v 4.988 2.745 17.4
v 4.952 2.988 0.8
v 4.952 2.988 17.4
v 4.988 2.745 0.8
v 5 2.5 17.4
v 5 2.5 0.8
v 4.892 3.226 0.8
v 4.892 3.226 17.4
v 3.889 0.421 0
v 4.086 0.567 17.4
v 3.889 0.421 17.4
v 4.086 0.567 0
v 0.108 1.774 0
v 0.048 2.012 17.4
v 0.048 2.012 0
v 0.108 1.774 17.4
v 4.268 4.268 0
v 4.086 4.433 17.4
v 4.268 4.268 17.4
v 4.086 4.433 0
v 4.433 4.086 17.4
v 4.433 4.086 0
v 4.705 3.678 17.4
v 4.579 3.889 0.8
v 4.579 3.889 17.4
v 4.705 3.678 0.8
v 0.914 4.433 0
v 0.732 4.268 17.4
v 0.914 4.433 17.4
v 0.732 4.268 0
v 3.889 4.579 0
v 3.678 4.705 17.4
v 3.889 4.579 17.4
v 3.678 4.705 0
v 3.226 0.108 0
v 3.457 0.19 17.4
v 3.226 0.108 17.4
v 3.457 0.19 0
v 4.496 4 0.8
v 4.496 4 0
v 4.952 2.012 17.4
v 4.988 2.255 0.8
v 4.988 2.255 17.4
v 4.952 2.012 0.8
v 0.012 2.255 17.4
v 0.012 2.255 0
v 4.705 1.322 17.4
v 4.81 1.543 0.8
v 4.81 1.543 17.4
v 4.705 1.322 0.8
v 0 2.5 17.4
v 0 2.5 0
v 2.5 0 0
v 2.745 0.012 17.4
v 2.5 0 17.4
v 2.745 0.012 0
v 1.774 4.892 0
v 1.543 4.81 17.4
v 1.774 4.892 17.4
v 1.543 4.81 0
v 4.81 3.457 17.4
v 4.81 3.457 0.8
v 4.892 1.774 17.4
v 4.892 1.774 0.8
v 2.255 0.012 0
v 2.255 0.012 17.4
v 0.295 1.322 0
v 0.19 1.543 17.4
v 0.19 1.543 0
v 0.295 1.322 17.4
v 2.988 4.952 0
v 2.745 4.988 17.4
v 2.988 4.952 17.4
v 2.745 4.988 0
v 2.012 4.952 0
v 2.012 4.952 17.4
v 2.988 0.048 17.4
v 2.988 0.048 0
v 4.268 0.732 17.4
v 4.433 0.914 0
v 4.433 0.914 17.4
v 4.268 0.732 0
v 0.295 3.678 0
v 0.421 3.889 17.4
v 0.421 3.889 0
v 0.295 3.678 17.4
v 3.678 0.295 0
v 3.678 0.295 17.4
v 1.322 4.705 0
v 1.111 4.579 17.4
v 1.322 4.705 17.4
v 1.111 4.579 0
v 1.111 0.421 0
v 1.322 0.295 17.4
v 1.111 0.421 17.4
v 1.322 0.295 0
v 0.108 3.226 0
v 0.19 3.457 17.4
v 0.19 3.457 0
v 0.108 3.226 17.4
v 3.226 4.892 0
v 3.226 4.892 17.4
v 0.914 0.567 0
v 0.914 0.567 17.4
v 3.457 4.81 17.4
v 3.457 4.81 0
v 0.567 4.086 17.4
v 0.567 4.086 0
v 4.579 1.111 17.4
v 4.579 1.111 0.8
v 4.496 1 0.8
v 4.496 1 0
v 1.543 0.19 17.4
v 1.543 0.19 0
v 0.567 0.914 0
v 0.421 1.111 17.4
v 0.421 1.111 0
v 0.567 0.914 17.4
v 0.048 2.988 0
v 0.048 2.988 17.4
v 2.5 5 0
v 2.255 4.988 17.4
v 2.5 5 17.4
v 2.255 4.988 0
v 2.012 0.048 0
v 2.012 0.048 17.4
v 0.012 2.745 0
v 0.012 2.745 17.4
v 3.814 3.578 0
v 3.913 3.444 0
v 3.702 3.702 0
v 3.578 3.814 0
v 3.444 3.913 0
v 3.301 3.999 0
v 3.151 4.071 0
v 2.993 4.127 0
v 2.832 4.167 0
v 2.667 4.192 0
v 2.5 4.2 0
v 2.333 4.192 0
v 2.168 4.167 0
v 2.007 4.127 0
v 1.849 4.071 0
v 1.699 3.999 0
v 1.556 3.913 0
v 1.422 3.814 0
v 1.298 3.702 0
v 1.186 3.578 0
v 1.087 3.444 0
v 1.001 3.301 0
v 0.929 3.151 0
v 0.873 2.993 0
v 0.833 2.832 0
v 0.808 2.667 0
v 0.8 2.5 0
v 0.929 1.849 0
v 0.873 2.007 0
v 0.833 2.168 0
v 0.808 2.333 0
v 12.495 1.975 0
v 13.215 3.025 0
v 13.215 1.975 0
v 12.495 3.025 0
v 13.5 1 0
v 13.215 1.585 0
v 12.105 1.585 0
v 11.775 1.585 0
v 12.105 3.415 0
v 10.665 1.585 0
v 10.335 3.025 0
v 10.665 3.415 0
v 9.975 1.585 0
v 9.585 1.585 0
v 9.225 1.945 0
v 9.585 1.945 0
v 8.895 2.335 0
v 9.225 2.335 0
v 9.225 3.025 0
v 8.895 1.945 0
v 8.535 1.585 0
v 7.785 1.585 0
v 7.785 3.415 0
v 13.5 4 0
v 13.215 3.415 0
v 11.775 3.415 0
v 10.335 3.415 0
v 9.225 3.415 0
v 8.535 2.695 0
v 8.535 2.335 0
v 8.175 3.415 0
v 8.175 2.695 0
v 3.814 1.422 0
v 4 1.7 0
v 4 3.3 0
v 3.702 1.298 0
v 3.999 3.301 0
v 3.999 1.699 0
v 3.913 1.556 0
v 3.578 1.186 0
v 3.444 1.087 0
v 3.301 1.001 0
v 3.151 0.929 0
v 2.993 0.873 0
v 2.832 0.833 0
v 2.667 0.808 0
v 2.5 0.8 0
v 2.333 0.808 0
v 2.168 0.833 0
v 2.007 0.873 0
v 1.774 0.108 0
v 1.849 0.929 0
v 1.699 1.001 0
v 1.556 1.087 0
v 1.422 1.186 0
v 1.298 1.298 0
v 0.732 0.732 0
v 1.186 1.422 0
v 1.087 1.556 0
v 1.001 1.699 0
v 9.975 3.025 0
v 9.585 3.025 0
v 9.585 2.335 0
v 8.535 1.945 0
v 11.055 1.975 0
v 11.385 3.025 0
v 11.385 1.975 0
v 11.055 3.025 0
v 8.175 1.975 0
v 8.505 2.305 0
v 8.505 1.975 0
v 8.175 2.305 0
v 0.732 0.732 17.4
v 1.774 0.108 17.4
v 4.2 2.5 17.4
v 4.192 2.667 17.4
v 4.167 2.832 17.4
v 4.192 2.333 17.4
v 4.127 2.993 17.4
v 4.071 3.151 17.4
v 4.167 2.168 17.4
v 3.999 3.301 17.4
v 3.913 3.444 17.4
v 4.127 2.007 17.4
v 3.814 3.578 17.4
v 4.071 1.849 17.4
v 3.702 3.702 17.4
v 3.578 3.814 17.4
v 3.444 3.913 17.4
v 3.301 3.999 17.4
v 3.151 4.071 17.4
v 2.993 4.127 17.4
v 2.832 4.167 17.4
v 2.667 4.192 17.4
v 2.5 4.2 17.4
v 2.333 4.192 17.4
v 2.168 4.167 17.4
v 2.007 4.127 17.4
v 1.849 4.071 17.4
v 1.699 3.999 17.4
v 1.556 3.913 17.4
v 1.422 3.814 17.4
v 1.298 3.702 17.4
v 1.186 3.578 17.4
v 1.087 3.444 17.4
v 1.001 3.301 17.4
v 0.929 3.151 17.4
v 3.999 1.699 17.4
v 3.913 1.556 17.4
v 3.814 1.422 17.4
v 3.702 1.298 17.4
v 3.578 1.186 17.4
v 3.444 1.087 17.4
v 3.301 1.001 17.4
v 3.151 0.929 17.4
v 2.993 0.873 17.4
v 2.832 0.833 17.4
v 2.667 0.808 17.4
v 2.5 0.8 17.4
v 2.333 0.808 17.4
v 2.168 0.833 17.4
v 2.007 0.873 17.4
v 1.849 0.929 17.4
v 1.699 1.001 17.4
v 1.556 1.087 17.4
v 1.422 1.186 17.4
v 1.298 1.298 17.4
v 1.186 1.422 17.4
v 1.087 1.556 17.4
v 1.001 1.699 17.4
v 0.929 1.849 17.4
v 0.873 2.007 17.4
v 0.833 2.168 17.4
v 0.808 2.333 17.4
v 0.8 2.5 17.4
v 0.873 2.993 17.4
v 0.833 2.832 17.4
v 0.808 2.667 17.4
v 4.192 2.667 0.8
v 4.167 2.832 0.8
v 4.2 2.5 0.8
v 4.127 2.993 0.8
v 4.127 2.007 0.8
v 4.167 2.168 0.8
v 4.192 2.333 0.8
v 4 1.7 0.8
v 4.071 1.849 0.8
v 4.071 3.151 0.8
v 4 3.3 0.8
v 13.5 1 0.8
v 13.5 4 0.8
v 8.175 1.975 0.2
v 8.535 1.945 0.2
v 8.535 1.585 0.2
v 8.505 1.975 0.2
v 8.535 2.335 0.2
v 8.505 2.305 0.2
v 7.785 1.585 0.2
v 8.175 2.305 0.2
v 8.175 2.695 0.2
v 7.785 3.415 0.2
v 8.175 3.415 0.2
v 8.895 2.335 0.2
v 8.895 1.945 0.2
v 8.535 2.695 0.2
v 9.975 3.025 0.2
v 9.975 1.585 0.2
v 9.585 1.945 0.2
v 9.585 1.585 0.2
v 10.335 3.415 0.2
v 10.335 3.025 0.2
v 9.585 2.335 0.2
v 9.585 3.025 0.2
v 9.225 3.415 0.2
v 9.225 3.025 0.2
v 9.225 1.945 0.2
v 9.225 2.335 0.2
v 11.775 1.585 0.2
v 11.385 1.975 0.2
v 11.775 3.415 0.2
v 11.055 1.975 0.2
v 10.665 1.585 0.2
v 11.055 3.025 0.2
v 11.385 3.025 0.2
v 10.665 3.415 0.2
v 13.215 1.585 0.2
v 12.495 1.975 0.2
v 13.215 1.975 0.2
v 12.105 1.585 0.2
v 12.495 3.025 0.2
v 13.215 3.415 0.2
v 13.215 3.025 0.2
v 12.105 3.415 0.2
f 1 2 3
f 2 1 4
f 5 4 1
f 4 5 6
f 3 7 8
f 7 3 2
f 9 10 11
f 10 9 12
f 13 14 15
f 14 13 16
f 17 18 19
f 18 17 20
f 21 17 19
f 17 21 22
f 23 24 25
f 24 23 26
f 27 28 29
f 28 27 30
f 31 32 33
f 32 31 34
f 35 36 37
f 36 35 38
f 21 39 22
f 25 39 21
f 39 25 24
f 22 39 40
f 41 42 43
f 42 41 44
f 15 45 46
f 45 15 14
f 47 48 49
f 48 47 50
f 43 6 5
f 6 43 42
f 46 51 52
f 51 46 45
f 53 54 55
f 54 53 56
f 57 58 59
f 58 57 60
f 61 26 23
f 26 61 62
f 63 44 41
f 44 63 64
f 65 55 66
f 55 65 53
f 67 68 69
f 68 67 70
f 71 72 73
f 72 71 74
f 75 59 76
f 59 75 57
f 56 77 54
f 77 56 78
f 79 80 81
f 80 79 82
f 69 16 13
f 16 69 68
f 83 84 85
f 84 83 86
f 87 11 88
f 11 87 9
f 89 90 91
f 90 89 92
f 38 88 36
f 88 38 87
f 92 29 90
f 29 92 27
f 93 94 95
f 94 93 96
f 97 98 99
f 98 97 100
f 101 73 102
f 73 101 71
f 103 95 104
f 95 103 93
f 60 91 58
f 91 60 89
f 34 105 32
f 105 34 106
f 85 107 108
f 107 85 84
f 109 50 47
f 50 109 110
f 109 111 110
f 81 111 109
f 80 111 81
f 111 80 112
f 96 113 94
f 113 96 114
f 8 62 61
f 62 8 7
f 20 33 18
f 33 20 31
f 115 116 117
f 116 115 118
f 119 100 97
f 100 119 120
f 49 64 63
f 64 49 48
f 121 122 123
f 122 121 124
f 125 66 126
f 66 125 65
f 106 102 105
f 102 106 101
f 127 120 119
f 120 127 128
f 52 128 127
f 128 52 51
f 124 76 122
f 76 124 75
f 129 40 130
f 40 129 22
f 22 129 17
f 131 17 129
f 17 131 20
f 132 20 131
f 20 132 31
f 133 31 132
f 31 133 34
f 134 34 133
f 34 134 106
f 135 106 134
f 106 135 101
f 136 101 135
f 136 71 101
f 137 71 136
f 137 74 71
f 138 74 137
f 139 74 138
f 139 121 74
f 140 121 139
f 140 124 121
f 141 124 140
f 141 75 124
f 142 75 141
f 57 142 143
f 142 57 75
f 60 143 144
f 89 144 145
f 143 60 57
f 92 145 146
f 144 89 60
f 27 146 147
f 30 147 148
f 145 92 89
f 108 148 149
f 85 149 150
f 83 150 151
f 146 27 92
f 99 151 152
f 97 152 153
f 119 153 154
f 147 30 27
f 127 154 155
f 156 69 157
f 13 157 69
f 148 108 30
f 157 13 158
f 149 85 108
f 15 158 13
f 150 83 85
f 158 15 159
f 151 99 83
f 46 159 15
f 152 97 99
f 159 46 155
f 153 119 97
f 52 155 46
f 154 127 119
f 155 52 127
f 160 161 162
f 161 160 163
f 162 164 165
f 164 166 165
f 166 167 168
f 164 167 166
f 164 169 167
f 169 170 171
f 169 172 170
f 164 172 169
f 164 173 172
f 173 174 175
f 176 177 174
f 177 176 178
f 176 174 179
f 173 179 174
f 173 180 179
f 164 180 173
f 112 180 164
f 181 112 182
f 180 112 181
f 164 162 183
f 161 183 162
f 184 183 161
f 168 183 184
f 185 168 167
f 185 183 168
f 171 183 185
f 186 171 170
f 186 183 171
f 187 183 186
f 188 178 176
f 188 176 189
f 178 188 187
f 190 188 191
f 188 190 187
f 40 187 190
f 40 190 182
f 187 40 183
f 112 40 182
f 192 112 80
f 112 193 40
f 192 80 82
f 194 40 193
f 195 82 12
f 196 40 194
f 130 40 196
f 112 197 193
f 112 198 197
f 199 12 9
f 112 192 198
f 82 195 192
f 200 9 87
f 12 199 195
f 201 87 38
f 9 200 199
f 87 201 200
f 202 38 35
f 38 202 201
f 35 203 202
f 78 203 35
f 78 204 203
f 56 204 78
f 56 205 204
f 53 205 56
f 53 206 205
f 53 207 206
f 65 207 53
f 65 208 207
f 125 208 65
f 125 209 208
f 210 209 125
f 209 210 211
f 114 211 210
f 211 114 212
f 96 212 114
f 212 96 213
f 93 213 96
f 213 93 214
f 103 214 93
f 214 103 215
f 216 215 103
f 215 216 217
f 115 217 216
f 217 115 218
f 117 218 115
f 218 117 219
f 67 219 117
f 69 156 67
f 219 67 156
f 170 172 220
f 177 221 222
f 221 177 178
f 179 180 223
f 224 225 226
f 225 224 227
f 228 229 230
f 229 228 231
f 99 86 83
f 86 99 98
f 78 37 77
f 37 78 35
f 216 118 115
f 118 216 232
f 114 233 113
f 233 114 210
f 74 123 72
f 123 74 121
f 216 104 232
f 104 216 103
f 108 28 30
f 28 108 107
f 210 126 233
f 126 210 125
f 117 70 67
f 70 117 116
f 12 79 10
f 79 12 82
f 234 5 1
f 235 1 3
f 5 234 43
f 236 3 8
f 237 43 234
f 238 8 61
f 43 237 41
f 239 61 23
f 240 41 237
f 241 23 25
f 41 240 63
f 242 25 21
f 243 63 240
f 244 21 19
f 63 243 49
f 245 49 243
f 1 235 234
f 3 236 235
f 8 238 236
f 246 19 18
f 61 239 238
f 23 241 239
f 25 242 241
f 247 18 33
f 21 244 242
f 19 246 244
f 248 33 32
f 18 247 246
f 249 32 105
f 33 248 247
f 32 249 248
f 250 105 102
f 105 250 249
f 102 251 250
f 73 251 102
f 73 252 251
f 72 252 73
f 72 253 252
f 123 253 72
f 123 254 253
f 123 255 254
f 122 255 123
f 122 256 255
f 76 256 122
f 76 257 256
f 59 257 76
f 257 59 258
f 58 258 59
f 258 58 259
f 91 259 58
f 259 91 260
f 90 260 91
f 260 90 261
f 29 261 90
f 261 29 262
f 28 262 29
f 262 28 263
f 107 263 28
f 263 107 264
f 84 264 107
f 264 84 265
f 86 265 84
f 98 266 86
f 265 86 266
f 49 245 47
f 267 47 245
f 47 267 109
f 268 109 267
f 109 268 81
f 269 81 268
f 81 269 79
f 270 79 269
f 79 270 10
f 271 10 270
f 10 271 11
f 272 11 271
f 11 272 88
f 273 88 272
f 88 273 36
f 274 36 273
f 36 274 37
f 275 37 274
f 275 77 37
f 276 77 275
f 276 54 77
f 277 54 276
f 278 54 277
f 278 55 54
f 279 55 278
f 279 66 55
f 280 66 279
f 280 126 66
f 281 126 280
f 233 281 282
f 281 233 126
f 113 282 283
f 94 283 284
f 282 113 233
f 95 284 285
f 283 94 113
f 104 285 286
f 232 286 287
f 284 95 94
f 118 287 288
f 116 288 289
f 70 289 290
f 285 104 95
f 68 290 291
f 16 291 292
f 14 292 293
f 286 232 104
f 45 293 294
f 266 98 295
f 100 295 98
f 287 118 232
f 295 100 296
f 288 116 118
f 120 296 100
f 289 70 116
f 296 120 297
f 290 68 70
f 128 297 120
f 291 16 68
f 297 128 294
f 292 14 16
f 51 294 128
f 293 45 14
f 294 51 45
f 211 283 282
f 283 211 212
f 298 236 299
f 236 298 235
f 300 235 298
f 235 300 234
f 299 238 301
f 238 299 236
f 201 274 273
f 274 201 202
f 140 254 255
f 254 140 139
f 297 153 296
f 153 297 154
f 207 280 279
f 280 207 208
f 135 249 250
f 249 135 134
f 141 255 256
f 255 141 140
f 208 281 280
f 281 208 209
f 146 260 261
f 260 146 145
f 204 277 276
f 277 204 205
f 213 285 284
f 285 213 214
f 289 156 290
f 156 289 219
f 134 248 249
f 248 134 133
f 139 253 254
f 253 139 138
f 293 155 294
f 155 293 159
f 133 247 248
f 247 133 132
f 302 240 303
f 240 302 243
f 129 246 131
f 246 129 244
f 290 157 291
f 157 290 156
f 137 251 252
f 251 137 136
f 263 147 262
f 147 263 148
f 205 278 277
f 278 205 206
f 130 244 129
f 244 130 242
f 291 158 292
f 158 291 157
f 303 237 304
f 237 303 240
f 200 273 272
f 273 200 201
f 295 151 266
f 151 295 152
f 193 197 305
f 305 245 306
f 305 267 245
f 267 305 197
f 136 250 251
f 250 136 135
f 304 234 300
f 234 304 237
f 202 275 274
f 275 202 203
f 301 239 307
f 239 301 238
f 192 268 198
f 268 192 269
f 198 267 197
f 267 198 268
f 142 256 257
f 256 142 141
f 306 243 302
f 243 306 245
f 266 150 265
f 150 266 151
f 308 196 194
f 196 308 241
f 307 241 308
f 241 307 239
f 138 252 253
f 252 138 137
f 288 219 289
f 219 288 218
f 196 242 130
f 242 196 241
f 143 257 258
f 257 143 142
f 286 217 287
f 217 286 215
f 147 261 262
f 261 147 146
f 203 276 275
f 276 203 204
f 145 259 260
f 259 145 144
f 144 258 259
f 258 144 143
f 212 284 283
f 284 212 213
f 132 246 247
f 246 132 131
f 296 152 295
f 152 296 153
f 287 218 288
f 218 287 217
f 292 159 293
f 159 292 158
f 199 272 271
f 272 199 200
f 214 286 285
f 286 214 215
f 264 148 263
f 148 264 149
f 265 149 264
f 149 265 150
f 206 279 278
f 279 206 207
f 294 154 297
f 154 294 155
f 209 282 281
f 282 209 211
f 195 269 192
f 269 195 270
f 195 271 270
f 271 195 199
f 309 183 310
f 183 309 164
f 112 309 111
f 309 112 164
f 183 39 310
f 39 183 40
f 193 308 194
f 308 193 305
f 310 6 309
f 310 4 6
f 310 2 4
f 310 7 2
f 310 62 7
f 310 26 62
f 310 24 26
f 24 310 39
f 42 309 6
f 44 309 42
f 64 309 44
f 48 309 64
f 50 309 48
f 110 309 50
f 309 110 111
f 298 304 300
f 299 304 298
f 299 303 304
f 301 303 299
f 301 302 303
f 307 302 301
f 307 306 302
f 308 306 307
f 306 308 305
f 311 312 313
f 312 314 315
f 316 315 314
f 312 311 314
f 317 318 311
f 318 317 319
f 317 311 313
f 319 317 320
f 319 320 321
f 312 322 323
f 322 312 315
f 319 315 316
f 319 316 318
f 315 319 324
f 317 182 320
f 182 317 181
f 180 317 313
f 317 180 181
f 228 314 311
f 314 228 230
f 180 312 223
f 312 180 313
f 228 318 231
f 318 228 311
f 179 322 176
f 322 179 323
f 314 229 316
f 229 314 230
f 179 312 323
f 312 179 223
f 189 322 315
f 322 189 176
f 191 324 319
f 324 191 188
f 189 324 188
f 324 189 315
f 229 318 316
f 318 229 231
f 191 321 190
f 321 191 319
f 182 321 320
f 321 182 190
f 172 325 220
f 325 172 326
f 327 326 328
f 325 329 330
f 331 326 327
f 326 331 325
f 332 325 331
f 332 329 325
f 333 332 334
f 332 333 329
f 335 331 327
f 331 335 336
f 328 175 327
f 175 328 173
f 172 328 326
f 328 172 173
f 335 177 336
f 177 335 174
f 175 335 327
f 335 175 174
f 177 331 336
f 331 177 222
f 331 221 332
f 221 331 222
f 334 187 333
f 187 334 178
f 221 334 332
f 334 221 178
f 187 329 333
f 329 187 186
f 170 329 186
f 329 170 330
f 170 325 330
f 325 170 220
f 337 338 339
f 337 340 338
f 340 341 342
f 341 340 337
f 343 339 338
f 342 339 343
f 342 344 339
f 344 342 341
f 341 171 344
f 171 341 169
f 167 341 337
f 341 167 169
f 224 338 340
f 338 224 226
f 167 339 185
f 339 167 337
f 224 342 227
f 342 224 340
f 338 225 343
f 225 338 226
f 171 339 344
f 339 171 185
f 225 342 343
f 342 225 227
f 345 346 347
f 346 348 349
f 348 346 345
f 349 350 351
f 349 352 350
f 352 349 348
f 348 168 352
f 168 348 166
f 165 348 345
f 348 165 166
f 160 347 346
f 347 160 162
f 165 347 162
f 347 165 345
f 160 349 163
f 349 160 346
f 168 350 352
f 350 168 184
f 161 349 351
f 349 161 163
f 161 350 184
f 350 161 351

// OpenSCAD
// 輪軸隔套含編號耳
$fn=64;
translate([2.5,-64.33504,1.1]){rotate([90,0,0]){difference(){union(){difference(){translate([0,-1.1,-66.83504]){rotate([-90,0,0]){translate([0,0,0]){cylinder(h=17.4,d1=5,d2=5,$fn=64);}}}translate([0,-2.1,-66.83504]){rotate([-90,0,0]){translate([0,0,0]){cylinder(h=19.4,d1=3.4,d2=3.4,$fn=64);}}}}translate([1.5,-1.1,-68.33504]){cube([9.5,0.8,3]);}}multmatrix([[1,0,0,8],[0,0,-1,-1.1],[0,1,0,-66.83504],[0,0,0,1]]){union(){union(){union(){union(){union(){union(){union(){union(){union(){union(){union(){union(){union(){union(){union(){union(){union(){union(){union(){union(){union(){union(){union(){union(){union(){union(){union(){union(){union(){union(){union(){union(){union(){union(){union(){union(){translate([-2.715,0.525,-0.2]){cube([0.39,0.39,0.32]);}translate([-2.355,0.525,-0.2]){cube([0.39,0.39,0.32]);}}translate([-2.715,0.165,-0.2]){cube([0.39,0.39,0.32]);}}translate([-1.995,0.165,-0.2]){cube([0.39,0.39,0.32]);}}translate([-2.715,-0.195,-0.2]){cube([0.39,0.39,0.32]);}}translate([-2.355,-0.195,-0.2]){cube([0.39,0.39,0.32]);}}translate([-2.715,-0.555,-0.2]){cube([0.39,0.39,0.32]);}}translate([-2.715,-0.915,-0.2]){cube([0.39,0.39,0.32]);}}translate([-0.915,0.525,-0.2]){cube([0.39,0.39,0.32]);}}translate([-1.275,0.165,-0.2]){cube([0.39,0.39,0.32]);}}translate([-0.915,0.165,-0.2]){cube([0.39,0.39,0.32]);}}translate([-0.915,-0.195,-0.2]){cube([0.39,0.39,0.32]);}}translate([-0.915,-0.555,-0.2]){cube([0.39,0.39,0.32]);}}translate([-1.275,-0.915,-0.2]){cube([0.39,0.39,0.32]);}}translate([-0.915,-0.915,-0.2]){cube([0.39,0.39,0.32]);}}translate([-0.555,-0.915,-0.2]){cube([0.39,0.39,0.32]);}}translate([0.165,0.525,-0.2]){cube([0.39,0.39,0.32]);}}translate([0.525,0.525,-0.2]){cube([0.39,0.39,0.32]);}}translate([0.885,0.525,-0.2]){cube([0.39,0.39,0.32]);}}translate([0.165,0.165,-0.2]){cube([0.39,0.39,0.32]);}}translate([0.885,0.165,-0.2]){cube([0.39,0.39,0.32]);}}translate([0.165,-0.195,-0.2]){cube([0.39,0.39,0.32]);}}translate([0.885,-0.195,-0.2]){cube([0.39,0.39,0.32]);}}translate([0.165,-0.555,-0.2]){cube([0.39,0.39,0.32]);}}translate([0.885,-0.555,-0.2]){cube([0.39,0.39,0.32]);}}translate([0.165,-0.915,-0.2]){cube([0.39,0.39,0.32]);}}translate([0.525,-0.915,-0.2]){cube([0.39,0.39,0.32]);}}translate([0.885,-0.915,-0.2]){cube([0.39,0.39,0.32]);}}translate([1.605,0.525,-0.2]){cube([0.39,0.39,0.32]);}}translate([1.965,0.525,-0.2]){cube([0.39,0.39,0.32]);}}translate([2.325,0.525,-0.2]){cube([0.39,0.39,0.32]);}}translate([1.605,0.165,-0.2]){cube([0.39,0.39,0.32]);}}translate([1.605,-0.195,-0.2]){cube([0.39,0.39,0.32]);}}translate([1.605,-0.555,-0.2]){cube([0.39,0.39,0.32]);}}translate([1.605,-0.915,-0.2]){cube([0.39,0.39,0.32]);}}translate([1.965,-0.915,-0.2]){cube([0.39,0.39,0.32]);}}translate([2.325,-0.915,-0.2]){cube([0.39,0.39,0.32]);}}}}}}
